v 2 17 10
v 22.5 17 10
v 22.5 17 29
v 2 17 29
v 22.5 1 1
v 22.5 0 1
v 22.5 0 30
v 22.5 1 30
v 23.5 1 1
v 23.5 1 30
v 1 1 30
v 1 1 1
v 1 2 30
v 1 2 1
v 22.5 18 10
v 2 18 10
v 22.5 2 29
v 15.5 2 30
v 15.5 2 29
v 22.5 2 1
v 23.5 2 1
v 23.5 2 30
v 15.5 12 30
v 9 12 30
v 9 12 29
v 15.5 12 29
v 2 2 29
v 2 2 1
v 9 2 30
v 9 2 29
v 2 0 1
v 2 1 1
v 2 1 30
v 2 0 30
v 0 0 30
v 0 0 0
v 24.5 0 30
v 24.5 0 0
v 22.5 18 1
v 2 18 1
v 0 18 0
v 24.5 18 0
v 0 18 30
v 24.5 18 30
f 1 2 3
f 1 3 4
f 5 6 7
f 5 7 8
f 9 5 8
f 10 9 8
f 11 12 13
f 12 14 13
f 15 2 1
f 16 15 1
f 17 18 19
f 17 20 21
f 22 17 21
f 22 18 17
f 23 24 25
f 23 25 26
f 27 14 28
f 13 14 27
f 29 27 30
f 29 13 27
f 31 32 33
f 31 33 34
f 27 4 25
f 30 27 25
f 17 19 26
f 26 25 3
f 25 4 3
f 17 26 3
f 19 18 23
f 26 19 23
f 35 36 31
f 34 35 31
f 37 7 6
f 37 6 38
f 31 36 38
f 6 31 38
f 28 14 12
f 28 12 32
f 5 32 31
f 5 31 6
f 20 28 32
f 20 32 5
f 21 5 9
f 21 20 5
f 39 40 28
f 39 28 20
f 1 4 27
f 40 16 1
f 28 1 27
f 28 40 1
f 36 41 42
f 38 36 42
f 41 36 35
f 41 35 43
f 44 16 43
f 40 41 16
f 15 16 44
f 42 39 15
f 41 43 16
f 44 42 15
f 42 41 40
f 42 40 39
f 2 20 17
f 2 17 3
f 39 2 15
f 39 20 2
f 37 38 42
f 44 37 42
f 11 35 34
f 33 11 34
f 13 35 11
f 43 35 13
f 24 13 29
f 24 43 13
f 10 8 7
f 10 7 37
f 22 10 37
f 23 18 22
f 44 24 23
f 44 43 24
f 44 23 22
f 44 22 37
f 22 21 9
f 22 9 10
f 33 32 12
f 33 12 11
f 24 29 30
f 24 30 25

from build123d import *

# Parameters (mm, degrees)
ESQUISSE1_W                  = 24.5
ESQUISSE1_H                  = 18
BOSS_EXTRU_3_DEPTH           = 30
ENL_V_MAT_EXTRU_1_DEPTH      = 43.711239739
ENL_V_MAT_EXTRU_1_DEPTH_BACK = 29
ENL_V_MAT_EXTRU_2_DEPTH      = 1
ESQUISSE6_W                  = 29
ESQUISSE6_H                  = 1
ENL_V_MAT_EXTRU_3_DEPTH      = 1
ESQUISSE7_W                  = 20.5
ESQUISSE7_H                  = 15
BOSS_EXTRU_4_DEPTH           = 1
ESQUISSE8_W                  = 6.5
ESQUISSE8_H                  = 10
ENL_V_MAT_EXTRU_4_DEPTH      = 1
ESQUISSE10_W                 = 20.5
ESQUISSE10_H                 = 9
ENL_V_MAT_EXTRU_5_DEPTH      = 43.299527184


with BuildPart() as part:
    # Esquisse1 → Boss.-Extru.3 (new body)
    with BuildSketch(Plane.XY):
        with Locations((12.25, 9)):
            Rectangle(ESQUISSE1_W, ESQUISSE1_H)
    extrude(amount=BOSS_EXTRU_3_DEPTH)

    # Esquisse4 → Enlèv. mat.-Extru.1 (cut, two sides: drawn at the far end of the back side and taken through both)
    with BuildSketch(Plane.XY.offset(30).offset(-ENL_V_MAT_EXTRU_1_DEPTH_BACK)):
        Polygon((22.5, -67.628118137), (22.5, 0), (22.5, 17), (2, 17), (2, 0), (2, -67.628118137), (2, -202.884354411), (22.5, -202.884354411), align=None)
    extrude(amount=ENL_V_MAT_EXTRU_1_DEPTH + ENL_V_MAT_EXTRU_1_DEPTH_BACK, mode=Mode.SUBTRACT)

    # Esquisse5 → Enlèv. mat.-Extru.2 (cut)
    with BuildSketch(Plane(origin=(2, 0, 0), x_dir=(0, 0, -1), z_dir=(1, 0, 0))):
        Polygon((-1, 1), (-30, 1), (-30, 2), (-2, 2), (-1, 2), align=None)
    extrude(amount=-ENL_V_MAT_EXTRU_2_DEPTH, mode=Mode.SUBTRACT)

    # Esquisse6 → Enlèv. mat.-Extru.3 (cut)
    with BuildSketch(Plane.ZY.offset(-22.5)):
        with Locations((15.5, 1.5)):
            Rectangle(ESQUISSE6_W, ESQUISSE6_H)
    extrude(amount=-ENL_V_MAT_EXTRU_3_DEPTH, mode=Mode.SUBTRACT)

    # Esquisse7 → Boss.-Extru.4 (add)
    with BuildSketch(Plane.XY.offset(30)):
        with Locations((12.25, 9.5)):
            Rectangle(ESQUISSE7_W, ESQUISSE7_H)
    extrude(amount=-BOSS_EXTRU_4_DEPTH)

    # Esquisse8 → Enlèv. mat.-Extru.4 (cut)
    with BuildSketch(Plane.XY.offset(30)):
        with Locations((12.25, 7)):
            Rectangle(ESQUISSE8_W, ESQUISSE8_H)
    extrude(amount=-ENL_V_MAT_EXTRU_4_DEPTH, mode=Mode.SUBTRACT)

    # Esquisse10 → Enlèv. mat.-Extru.5 (cut, through all)
    with BuildSketch(Plane(origin=(0, 17, 0), x_dir=(-1, 0, 0), z_dir=(0, -1, 0))):
        with Locations((-12.25, -5.5)):
            Rectangle(ESQUISSE10_W, ESQUISSE10_H)
    extrude(amount=-ENL_V_MAT_EXTRU_5_DEPTH, mode=Mode.SUBTRACT)


solid = part.part
